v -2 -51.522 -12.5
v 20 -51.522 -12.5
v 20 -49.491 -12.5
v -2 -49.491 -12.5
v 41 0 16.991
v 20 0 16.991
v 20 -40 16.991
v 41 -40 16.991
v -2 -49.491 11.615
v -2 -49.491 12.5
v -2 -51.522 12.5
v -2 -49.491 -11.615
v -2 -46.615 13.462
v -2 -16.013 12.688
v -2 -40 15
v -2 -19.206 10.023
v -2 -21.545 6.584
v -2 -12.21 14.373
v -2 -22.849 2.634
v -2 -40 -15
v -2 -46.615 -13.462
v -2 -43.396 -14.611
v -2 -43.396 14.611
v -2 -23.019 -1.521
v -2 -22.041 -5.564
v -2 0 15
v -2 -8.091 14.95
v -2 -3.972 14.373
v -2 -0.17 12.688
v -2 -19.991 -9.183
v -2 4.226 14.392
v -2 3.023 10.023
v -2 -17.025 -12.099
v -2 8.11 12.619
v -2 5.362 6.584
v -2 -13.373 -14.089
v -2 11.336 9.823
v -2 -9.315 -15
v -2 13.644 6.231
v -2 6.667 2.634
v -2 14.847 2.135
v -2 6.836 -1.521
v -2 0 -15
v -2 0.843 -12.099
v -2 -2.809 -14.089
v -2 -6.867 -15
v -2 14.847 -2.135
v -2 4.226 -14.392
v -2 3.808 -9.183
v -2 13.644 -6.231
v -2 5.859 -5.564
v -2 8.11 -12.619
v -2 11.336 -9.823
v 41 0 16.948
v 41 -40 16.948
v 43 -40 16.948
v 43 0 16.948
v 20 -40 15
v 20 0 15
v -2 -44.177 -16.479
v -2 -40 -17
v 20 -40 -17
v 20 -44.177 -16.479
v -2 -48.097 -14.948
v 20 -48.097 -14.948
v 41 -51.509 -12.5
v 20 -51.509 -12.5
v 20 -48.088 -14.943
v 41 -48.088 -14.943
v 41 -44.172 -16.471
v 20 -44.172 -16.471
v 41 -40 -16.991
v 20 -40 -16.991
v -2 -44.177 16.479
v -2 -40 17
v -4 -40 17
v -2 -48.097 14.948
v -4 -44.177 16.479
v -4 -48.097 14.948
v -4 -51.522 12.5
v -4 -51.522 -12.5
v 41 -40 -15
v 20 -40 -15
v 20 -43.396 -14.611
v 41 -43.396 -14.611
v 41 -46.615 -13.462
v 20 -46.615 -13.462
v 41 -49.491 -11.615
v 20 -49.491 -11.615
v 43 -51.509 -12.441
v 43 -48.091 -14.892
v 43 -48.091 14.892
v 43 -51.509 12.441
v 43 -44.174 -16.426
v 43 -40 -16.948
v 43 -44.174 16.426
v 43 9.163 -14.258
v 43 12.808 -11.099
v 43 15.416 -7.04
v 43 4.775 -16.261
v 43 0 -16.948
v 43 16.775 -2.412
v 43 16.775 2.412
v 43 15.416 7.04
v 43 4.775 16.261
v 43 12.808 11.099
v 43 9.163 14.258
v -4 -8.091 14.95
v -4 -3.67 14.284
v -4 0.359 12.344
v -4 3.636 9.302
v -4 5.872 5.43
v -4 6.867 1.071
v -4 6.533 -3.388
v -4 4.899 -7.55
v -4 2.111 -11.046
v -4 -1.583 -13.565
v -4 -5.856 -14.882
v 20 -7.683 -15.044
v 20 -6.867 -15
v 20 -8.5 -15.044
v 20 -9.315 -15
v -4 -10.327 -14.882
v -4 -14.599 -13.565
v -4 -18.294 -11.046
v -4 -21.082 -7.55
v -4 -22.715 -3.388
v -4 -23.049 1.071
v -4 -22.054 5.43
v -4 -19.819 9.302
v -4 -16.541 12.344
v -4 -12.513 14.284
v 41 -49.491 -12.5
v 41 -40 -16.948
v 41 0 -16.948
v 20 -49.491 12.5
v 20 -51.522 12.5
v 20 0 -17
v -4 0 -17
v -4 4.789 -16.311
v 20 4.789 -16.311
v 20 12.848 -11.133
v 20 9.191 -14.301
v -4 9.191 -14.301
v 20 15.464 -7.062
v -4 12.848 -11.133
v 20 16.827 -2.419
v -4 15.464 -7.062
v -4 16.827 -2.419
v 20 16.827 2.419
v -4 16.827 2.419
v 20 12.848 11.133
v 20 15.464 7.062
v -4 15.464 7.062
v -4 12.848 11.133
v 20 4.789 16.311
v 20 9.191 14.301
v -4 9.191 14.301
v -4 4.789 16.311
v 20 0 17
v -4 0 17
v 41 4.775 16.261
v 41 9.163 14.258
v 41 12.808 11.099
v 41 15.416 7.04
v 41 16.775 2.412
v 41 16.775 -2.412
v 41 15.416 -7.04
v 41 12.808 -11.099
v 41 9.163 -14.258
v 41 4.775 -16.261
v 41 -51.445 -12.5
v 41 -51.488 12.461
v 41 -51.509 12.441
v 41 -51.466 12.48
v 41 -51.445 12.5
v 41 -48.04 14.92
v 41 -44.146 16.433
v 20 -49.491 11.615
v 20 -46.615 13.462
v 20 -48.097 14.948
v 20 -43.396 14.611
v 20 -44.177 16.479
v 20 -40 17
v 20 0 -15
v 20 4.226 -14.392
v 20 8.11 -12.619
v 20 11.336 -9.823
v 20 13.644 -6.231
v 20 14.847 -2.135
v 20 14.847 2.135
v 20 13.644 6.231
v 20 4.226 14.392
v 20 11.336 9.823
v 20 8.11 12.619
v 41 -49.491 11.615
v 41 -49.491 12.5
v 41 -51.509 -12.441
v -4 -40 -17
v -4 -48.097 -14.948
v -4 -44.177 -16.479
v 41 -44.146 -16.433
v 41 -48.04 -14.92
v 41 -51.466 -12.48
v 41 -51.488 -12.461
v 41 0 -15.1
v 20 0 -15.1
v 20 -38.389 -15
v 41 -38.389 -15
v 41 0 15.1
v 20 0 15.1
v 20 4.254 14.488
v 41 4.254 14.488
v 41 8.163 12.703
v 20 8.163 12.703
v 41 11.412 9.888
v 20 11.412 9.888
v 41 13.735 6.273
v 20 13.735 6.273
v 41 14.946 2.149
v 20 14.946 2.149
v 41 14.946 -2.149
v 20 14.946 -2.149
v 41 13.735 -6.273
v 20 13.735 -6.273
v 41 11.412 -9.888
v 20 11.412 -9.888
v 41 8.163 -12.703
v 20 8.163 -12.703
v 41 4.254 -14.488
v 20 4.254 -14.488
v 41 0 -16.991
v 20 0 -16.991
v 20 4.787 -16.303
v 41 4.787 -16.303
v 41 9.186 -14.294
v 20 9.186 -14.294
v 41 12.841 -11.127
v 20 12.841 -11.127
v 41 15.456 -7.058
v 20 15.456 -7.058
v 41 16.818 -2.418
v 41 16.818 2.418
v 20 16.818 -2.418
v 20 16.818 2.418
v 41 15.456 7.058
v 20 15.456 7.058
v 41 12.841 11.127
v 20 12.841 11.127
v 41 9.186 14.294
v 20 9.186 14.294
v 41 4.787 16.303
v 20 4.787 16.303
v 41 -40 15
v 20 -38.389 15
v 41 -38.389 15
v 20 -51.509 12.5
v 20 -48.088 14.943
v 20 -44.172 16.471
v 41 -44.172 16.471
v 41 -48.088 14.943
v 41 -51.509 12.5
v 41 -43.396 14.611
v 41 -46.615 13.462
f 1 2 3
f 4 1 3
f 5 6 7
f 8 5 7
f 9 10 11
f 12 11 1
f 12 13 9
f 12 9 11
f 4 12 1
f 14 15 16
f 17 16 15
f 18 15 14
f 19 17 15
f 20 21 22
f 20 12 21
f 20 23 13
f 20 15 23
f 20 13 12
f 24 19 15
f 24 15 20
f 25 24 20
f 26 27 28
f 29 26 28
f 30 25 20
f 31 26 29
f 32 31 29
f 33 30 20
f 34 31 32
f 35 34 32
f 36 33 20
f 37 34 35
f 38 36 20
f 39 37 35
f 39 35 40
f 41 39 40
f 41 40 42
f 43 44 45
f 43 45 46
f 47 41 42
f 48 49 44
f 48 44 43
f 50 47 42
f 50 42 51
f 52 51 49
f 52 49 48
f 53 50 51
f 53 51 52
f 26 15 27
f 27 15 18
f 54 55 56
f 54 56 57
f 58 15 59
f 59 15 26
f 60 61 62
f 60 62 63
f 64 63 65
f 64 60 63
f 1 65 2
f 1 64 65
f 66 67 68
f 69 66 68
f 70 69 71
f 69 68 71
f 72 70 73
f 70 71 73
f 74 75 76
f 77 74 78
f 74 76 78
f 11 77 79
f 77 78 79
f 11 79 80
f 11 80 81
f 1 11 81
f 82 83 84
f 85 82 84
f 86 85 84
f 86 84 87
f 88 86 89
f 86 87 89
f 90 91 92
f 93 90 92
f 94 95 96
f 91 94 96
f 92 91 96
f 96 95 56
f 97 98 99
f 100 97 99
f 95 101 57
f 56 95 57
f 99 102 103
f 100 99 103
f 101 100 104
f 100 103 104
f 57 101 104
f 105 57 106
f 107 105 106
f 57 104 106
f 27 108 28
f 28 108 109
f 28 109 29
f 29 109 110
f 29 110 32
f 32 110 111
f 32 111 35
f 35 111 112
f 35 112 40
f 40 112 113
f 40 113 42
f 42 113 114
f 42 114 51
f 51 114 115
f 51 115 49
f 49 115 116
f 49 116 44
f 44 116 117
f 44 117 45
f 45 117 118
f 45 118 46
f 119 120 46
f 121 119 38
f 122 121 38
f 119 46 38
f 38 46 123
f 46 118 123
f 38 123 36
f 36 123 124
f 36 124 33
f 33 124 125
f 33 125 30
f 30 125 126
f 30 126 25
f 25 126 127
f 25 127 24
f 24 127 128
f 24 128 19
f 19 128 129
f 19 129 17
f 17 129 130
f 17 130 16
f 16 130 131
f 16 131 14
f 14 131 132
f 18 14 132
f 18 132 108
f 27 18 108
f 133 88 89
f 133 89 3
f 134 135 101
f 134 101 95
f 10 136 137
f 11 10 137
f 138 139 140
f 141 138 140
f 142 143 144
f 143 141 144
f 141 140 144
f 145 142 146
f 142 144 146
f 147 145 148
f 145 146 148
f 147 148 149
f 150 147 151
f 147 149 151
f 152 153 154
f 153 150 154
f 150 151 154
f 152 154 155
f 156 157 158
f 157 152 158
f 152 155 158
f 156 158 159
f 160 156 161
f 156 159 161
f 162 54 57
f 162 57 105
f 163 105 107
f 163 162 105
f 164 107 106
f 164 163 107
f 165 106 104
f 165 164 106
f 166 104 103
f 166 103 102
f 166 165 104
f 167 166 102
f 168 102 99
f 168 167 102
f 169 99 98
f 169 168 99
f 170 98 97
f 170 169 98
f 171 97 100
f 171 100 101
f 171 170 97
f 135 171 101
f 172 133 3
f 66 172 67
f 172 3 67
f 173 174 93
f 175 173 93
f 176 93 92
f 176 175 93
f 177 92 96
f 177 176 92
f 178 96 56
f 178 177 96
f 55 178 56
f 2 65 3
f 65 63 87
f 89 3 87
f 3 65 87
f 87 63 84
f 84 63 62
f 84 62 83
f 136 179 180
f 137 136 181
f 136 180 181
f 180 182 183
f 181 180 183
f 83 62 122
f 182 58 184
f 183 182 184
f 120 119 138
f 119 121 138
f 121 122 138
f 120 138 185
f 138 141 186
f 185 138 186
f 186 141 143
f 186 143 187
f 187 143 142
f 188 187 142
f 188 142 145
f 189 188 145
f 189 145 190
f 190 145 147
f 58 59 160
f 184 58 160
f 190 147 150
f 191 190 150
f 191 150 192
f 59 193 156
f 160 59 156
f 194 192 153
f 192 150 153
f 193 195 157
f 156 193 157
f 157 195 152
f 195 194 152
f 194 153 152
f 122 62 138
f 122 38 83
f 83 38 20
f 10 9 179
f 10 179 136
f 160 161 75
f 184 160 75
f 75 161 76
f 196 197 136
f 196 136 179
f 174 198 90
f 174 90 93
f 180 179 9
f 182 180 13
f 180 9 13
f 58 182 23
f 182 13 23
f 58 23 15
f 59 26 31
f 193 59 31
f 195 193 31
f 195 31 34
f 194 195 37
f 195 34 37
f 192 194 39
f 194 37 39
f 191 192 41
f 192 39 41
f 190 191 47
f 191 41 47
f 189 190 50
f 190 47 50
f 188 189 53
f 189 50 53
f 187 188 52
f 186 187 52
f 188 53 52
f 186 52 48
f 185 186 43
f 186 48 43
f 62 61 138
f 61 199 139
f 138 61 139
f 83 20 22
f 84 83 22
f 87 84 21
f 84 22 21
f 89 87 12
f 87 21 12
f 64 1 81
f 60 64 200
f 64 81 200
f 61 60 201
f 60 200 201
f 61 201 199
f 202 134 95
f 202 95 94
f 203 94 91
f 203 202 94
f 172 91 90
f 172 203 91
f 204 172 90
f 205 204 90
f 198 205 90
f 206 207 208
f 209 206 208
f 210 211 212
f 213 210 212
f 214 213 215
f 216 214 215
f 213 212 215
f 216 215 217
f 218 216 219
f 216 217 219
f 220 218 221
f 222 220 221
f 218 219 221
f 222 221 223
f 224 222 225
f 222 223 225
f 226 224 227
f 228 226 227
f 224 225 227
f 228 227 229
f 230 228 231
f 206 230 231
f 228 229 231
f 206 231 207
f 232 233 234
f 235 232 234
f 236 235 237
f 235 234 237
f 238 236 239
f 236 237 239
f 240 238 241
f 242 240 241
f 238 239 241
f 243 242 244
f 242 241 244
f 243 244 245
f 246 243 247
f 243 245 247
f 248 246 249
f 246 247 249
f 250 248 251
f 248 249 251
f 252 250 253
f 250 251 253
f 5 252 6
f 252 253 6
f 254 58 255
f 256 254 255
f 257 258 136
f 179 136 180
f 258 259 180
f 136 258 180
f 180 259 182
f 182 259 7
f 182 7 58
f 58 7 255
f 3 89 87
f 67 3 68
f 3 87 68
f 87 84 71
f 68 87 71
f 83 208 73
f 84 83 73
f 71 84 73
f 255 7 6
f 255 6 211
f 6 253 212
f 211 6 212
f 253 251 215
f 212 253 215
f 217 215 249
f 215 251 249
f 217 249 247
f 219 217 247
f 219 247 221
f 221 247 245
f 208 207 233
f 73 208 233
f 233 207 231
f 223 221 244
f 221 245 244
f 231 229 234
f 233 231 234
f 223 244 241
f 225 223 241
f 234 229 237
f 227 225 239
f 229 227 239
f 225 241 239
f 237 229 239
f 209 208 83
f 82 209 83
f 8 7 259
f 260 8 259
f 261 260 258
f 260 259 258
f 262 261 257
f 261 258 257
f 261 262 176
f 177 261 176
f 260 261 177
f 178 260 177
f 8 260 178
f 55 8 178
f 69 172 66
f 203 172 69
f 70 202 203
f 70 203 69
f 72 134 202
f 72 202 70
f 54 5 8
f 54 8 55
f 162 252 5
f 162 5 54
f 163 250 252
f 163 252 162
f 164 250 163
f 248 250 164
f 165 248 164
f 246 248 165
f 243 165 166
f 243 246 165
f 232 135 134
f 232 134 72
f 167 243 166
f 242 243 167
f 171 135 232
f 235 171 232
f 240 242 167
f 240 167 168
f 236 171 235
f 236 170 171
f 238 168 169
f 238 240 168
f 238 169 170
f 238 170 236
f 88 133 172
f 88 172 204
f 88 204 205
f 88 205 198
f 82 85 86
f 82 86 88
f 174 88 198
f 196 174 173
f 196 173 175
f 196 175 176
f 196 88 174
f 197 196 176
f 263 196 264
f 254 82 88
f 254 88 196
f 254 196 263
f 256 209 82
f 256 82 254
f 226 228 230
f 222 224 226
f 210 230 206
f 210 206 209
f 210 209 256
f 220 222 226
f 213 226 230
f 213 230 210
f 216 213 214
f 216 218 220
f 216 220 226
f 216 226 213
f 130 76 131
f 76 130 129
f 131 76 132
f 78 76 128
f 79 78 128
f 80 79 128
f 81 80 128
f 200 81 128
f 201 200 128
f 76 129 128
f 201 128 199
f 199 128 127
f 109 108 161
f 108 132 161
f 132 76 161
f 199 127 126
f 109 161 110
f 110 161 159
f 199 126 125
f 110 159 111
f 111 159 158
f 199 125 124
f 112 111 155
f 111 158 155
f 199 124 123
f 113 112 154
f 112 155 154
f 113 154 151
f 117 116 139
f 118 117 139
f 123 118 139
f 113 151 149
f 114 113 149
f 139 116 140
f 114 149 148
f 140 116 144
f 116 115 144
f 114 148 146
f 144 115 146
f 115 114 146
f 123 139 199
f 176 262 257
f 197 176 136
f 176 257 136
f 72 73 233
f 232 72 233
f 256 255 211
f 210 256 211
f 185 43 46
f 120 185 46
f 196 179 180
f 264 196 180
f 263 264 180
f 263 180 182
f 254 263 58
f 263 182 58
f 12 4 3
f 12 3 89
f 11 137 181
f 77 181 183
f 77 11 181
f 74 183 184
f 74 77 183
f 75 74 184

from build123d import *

# Parameters (mm, degrees)
BOSS_EXTRUDE1_DEPTH      = 20
BOSS_EXTRUDE1_DEPTH_BACK = 2
CUT_EXTRUDE3_DEPTH       = 64.419239983
BOSS_EXTRUDE2_START      = 2
BOSS_EXTRUDE2_DEPTH      = 2
SKETCH6_R                = 15
CUT_EXTRUDE4_DEPTH       = 60.32526856
BOSS_EXTRUDE3_DEPTH      = 21
BOSS_EXTRUDE5_DEPTH      = 2


with BuildPart() as part:
    # Sketch1 → Boss-Extrude1 (new, two sides: drawn at the far end of the back side and taken through both)
    with BuildSketch(Plane(origin=(0, 0, 0), x_dir=(0, 0, -1), z_dir=(1, 0, 0)).offset(-BOSS_EXTRUDE1_DEPTH_BACK)):
        with BuildLine():
            Line((17, 0), (17, -40))
            ThreePointArc((17, -40), (0, -57), (-17, -40))
            Line((-17, -40), (-17, 0))
            ThreePointArc((-17, 0), (0, 17), (17, 0))
        make_face()
        with BuildLine():
            Line((15, 0), (15, -40))
            ThreePointArc((15, -40), (0, -55), (-15, -40))
            Line((-15, -40), (-15, 0))
            ThreePointArc((-15, 0), (0, 15), (15, 0))
        make_face(mode=Mode.SUBTRACT)
    extrude(amount=BOSS_EXTRUDE1_DEPTH + BOSS_EXTRUDE1_DEPTH_BACK)

    # Sketch4 → Cut-Extrude3 (cut, through all)
    with BuildSketch(Plane(origin=(20, 0, 0), x_dir=(0, 0, -1), z_dir=(1, 0, 0))):
        with BuildLine():
            ThreePointArc((-9.64115149, -51.491222648), (-10.675198738, -50.537558157), (-11.615364508, -49.491222648))
            Line((-11.615364508, -49.491222648), (-12.5, -49.491222648))
            Line((-12.5, -49.491222648), (-12.5, -51.491222648))
            Line((-12.5, -51.491222648), (-12.5, -51.521718622))
            ThreePointArc((-12.5, -51.521718622), (0, -57), (12.5, -51.521718622))
            Line((12.5, -51.521718622), (12.5, -51.491222648))
            Line((12.5, -51.491222648), (12.5, -49.491222648))
            Line((12.5, -49.491222648), (11.615364508, -49.491222648))
            ThreePointArc((11.615364508, -49.491222648), (1.405126065, -54.934042344), (-9.64115149, -51.491222648))
        make_face()
    extrude(amount=-CUT_EXTRUDE3_DEPTH, mode=Mode.SUBTRACT)

    # Sketch5 → Boss-Extrude2 (add)
    with BuildSketch(Plane.ZY.offset(2).offset(BOSS_EXTRUDE2_START)):
        with BuildLine():
            Line((17, 0), (17, -40))
            ThreePointArc((17, -40), (15.835087622, -46.184658438), (12.5, -51.521718622))
            Line((12.5, -51.521718622), (-12.5, -51.521718622))
            ThreePointArc((-12.5, -51.521718622), (-15.835087622, -46.184658438), (-17, -40))
            Line((-17, -40), (-17, 0))
            ThreePointArc((-17, 0), (0, 17), (17, 0))
        make_face()
    extrude(amount=-BOSS_EXTRUDE2_DEPTH)

    # Sketch6 → Cut-Extrude4 (cut, through all)
    with BuildSketch(Plane.ZY.offset(4)):
        with Locations((-0.05, -8.091222648)):
            Circle(SKETCH6_R)
    extrude(amount=-CUT_EXTRUDE4_DEPTH, mode=Mode.SUBTRACT)


with BuildPart() as body_2:
    # Sketch7 → Boss-Extrude3 (new body)
    with BuildSketch(Plane(origin=(20, 0, 0), x_dir=(0, 0, -1), z_dir=(1, 0, 0))):
        with BuildLine():
            Line((-12.5, -51.509017495), (-12.5, -49.491222648))
            Line((-12.5, -49.491222648), (-11.615364508, -49.491222648))
            ThreePointArc((-11.615364508, -49.491222648), (-14.128525536, -45.038329703), (-15, -40))
            Line((-15, -40), (-15, -38.389225494))
            Line((-15, -38.389225494), (-15.099585299, 0))
            ThreePointArc((-15.099585299, 0), (0, 15.099585299), (15.099585299, 0))
            Line((15.099585299, 0), (15, -38.389225494))
            Line((15, -38.389225494), (15, -40))
            ThreePointArc((15, -40), (14.128525536, -45.038329703), (11.615364508, -49.491222648))
            Line((11.615364508, -49.491222648), (12.5, -49.491222648))
            Line((12.5, -49.491222648), (12.5, -51.509017495))
            ThreePointArc((12.5, -51.509017495), (15.82876991, -46.177177903), (16.991394401, -40))
            Line((16.991394401, -40), (16.991394401, 0))
            ThreePointArc((16.991394401, 0), (0, 16.991394401), (-16.991394401, 0))
            Line((-16.991394401, 0), (-16.991394401, -40))
            ThreePointArc((-16.991394401, -40), (-15.82876991, -46.177177903), (-12.5, -51.509017495))
        make_face()
    extrude(amount=BOSS_EXTRUDE3_DEPTH)

    # Sketch10 → Boss-Extrude5 (add)
    with BuildSketch(Plane(origin=(41, 0, 0), x_dir=(0, 0, -1), z_dir=(1, 0, 0))):
        with BuildLine():
            Line((-16.947994575, -40), (-16.947994575, 0))
            ThreePointArc((-16.947994575, 0), (0, 16.947994575), (16.947994575, 0))
            Line((16.947994575, 0), (16.947994575, -40))
            ThreePointArc((16.947994575, -40), (15.781057263, -46.180028461), (12.440941943, -51.509017495))
            Line((12.440941943, -51.509017495), (-12.440941943, -51.509017495))
            ThreePointArc((-12.440941943, -51.509017495), (-15.781057263, -46.180028461), (-16.947994575, -40))
        make_face()
    extrude(amount=BOSS_EXTRUDE5_DEPTH)


solid = Compound([part.part, body_2.part])
